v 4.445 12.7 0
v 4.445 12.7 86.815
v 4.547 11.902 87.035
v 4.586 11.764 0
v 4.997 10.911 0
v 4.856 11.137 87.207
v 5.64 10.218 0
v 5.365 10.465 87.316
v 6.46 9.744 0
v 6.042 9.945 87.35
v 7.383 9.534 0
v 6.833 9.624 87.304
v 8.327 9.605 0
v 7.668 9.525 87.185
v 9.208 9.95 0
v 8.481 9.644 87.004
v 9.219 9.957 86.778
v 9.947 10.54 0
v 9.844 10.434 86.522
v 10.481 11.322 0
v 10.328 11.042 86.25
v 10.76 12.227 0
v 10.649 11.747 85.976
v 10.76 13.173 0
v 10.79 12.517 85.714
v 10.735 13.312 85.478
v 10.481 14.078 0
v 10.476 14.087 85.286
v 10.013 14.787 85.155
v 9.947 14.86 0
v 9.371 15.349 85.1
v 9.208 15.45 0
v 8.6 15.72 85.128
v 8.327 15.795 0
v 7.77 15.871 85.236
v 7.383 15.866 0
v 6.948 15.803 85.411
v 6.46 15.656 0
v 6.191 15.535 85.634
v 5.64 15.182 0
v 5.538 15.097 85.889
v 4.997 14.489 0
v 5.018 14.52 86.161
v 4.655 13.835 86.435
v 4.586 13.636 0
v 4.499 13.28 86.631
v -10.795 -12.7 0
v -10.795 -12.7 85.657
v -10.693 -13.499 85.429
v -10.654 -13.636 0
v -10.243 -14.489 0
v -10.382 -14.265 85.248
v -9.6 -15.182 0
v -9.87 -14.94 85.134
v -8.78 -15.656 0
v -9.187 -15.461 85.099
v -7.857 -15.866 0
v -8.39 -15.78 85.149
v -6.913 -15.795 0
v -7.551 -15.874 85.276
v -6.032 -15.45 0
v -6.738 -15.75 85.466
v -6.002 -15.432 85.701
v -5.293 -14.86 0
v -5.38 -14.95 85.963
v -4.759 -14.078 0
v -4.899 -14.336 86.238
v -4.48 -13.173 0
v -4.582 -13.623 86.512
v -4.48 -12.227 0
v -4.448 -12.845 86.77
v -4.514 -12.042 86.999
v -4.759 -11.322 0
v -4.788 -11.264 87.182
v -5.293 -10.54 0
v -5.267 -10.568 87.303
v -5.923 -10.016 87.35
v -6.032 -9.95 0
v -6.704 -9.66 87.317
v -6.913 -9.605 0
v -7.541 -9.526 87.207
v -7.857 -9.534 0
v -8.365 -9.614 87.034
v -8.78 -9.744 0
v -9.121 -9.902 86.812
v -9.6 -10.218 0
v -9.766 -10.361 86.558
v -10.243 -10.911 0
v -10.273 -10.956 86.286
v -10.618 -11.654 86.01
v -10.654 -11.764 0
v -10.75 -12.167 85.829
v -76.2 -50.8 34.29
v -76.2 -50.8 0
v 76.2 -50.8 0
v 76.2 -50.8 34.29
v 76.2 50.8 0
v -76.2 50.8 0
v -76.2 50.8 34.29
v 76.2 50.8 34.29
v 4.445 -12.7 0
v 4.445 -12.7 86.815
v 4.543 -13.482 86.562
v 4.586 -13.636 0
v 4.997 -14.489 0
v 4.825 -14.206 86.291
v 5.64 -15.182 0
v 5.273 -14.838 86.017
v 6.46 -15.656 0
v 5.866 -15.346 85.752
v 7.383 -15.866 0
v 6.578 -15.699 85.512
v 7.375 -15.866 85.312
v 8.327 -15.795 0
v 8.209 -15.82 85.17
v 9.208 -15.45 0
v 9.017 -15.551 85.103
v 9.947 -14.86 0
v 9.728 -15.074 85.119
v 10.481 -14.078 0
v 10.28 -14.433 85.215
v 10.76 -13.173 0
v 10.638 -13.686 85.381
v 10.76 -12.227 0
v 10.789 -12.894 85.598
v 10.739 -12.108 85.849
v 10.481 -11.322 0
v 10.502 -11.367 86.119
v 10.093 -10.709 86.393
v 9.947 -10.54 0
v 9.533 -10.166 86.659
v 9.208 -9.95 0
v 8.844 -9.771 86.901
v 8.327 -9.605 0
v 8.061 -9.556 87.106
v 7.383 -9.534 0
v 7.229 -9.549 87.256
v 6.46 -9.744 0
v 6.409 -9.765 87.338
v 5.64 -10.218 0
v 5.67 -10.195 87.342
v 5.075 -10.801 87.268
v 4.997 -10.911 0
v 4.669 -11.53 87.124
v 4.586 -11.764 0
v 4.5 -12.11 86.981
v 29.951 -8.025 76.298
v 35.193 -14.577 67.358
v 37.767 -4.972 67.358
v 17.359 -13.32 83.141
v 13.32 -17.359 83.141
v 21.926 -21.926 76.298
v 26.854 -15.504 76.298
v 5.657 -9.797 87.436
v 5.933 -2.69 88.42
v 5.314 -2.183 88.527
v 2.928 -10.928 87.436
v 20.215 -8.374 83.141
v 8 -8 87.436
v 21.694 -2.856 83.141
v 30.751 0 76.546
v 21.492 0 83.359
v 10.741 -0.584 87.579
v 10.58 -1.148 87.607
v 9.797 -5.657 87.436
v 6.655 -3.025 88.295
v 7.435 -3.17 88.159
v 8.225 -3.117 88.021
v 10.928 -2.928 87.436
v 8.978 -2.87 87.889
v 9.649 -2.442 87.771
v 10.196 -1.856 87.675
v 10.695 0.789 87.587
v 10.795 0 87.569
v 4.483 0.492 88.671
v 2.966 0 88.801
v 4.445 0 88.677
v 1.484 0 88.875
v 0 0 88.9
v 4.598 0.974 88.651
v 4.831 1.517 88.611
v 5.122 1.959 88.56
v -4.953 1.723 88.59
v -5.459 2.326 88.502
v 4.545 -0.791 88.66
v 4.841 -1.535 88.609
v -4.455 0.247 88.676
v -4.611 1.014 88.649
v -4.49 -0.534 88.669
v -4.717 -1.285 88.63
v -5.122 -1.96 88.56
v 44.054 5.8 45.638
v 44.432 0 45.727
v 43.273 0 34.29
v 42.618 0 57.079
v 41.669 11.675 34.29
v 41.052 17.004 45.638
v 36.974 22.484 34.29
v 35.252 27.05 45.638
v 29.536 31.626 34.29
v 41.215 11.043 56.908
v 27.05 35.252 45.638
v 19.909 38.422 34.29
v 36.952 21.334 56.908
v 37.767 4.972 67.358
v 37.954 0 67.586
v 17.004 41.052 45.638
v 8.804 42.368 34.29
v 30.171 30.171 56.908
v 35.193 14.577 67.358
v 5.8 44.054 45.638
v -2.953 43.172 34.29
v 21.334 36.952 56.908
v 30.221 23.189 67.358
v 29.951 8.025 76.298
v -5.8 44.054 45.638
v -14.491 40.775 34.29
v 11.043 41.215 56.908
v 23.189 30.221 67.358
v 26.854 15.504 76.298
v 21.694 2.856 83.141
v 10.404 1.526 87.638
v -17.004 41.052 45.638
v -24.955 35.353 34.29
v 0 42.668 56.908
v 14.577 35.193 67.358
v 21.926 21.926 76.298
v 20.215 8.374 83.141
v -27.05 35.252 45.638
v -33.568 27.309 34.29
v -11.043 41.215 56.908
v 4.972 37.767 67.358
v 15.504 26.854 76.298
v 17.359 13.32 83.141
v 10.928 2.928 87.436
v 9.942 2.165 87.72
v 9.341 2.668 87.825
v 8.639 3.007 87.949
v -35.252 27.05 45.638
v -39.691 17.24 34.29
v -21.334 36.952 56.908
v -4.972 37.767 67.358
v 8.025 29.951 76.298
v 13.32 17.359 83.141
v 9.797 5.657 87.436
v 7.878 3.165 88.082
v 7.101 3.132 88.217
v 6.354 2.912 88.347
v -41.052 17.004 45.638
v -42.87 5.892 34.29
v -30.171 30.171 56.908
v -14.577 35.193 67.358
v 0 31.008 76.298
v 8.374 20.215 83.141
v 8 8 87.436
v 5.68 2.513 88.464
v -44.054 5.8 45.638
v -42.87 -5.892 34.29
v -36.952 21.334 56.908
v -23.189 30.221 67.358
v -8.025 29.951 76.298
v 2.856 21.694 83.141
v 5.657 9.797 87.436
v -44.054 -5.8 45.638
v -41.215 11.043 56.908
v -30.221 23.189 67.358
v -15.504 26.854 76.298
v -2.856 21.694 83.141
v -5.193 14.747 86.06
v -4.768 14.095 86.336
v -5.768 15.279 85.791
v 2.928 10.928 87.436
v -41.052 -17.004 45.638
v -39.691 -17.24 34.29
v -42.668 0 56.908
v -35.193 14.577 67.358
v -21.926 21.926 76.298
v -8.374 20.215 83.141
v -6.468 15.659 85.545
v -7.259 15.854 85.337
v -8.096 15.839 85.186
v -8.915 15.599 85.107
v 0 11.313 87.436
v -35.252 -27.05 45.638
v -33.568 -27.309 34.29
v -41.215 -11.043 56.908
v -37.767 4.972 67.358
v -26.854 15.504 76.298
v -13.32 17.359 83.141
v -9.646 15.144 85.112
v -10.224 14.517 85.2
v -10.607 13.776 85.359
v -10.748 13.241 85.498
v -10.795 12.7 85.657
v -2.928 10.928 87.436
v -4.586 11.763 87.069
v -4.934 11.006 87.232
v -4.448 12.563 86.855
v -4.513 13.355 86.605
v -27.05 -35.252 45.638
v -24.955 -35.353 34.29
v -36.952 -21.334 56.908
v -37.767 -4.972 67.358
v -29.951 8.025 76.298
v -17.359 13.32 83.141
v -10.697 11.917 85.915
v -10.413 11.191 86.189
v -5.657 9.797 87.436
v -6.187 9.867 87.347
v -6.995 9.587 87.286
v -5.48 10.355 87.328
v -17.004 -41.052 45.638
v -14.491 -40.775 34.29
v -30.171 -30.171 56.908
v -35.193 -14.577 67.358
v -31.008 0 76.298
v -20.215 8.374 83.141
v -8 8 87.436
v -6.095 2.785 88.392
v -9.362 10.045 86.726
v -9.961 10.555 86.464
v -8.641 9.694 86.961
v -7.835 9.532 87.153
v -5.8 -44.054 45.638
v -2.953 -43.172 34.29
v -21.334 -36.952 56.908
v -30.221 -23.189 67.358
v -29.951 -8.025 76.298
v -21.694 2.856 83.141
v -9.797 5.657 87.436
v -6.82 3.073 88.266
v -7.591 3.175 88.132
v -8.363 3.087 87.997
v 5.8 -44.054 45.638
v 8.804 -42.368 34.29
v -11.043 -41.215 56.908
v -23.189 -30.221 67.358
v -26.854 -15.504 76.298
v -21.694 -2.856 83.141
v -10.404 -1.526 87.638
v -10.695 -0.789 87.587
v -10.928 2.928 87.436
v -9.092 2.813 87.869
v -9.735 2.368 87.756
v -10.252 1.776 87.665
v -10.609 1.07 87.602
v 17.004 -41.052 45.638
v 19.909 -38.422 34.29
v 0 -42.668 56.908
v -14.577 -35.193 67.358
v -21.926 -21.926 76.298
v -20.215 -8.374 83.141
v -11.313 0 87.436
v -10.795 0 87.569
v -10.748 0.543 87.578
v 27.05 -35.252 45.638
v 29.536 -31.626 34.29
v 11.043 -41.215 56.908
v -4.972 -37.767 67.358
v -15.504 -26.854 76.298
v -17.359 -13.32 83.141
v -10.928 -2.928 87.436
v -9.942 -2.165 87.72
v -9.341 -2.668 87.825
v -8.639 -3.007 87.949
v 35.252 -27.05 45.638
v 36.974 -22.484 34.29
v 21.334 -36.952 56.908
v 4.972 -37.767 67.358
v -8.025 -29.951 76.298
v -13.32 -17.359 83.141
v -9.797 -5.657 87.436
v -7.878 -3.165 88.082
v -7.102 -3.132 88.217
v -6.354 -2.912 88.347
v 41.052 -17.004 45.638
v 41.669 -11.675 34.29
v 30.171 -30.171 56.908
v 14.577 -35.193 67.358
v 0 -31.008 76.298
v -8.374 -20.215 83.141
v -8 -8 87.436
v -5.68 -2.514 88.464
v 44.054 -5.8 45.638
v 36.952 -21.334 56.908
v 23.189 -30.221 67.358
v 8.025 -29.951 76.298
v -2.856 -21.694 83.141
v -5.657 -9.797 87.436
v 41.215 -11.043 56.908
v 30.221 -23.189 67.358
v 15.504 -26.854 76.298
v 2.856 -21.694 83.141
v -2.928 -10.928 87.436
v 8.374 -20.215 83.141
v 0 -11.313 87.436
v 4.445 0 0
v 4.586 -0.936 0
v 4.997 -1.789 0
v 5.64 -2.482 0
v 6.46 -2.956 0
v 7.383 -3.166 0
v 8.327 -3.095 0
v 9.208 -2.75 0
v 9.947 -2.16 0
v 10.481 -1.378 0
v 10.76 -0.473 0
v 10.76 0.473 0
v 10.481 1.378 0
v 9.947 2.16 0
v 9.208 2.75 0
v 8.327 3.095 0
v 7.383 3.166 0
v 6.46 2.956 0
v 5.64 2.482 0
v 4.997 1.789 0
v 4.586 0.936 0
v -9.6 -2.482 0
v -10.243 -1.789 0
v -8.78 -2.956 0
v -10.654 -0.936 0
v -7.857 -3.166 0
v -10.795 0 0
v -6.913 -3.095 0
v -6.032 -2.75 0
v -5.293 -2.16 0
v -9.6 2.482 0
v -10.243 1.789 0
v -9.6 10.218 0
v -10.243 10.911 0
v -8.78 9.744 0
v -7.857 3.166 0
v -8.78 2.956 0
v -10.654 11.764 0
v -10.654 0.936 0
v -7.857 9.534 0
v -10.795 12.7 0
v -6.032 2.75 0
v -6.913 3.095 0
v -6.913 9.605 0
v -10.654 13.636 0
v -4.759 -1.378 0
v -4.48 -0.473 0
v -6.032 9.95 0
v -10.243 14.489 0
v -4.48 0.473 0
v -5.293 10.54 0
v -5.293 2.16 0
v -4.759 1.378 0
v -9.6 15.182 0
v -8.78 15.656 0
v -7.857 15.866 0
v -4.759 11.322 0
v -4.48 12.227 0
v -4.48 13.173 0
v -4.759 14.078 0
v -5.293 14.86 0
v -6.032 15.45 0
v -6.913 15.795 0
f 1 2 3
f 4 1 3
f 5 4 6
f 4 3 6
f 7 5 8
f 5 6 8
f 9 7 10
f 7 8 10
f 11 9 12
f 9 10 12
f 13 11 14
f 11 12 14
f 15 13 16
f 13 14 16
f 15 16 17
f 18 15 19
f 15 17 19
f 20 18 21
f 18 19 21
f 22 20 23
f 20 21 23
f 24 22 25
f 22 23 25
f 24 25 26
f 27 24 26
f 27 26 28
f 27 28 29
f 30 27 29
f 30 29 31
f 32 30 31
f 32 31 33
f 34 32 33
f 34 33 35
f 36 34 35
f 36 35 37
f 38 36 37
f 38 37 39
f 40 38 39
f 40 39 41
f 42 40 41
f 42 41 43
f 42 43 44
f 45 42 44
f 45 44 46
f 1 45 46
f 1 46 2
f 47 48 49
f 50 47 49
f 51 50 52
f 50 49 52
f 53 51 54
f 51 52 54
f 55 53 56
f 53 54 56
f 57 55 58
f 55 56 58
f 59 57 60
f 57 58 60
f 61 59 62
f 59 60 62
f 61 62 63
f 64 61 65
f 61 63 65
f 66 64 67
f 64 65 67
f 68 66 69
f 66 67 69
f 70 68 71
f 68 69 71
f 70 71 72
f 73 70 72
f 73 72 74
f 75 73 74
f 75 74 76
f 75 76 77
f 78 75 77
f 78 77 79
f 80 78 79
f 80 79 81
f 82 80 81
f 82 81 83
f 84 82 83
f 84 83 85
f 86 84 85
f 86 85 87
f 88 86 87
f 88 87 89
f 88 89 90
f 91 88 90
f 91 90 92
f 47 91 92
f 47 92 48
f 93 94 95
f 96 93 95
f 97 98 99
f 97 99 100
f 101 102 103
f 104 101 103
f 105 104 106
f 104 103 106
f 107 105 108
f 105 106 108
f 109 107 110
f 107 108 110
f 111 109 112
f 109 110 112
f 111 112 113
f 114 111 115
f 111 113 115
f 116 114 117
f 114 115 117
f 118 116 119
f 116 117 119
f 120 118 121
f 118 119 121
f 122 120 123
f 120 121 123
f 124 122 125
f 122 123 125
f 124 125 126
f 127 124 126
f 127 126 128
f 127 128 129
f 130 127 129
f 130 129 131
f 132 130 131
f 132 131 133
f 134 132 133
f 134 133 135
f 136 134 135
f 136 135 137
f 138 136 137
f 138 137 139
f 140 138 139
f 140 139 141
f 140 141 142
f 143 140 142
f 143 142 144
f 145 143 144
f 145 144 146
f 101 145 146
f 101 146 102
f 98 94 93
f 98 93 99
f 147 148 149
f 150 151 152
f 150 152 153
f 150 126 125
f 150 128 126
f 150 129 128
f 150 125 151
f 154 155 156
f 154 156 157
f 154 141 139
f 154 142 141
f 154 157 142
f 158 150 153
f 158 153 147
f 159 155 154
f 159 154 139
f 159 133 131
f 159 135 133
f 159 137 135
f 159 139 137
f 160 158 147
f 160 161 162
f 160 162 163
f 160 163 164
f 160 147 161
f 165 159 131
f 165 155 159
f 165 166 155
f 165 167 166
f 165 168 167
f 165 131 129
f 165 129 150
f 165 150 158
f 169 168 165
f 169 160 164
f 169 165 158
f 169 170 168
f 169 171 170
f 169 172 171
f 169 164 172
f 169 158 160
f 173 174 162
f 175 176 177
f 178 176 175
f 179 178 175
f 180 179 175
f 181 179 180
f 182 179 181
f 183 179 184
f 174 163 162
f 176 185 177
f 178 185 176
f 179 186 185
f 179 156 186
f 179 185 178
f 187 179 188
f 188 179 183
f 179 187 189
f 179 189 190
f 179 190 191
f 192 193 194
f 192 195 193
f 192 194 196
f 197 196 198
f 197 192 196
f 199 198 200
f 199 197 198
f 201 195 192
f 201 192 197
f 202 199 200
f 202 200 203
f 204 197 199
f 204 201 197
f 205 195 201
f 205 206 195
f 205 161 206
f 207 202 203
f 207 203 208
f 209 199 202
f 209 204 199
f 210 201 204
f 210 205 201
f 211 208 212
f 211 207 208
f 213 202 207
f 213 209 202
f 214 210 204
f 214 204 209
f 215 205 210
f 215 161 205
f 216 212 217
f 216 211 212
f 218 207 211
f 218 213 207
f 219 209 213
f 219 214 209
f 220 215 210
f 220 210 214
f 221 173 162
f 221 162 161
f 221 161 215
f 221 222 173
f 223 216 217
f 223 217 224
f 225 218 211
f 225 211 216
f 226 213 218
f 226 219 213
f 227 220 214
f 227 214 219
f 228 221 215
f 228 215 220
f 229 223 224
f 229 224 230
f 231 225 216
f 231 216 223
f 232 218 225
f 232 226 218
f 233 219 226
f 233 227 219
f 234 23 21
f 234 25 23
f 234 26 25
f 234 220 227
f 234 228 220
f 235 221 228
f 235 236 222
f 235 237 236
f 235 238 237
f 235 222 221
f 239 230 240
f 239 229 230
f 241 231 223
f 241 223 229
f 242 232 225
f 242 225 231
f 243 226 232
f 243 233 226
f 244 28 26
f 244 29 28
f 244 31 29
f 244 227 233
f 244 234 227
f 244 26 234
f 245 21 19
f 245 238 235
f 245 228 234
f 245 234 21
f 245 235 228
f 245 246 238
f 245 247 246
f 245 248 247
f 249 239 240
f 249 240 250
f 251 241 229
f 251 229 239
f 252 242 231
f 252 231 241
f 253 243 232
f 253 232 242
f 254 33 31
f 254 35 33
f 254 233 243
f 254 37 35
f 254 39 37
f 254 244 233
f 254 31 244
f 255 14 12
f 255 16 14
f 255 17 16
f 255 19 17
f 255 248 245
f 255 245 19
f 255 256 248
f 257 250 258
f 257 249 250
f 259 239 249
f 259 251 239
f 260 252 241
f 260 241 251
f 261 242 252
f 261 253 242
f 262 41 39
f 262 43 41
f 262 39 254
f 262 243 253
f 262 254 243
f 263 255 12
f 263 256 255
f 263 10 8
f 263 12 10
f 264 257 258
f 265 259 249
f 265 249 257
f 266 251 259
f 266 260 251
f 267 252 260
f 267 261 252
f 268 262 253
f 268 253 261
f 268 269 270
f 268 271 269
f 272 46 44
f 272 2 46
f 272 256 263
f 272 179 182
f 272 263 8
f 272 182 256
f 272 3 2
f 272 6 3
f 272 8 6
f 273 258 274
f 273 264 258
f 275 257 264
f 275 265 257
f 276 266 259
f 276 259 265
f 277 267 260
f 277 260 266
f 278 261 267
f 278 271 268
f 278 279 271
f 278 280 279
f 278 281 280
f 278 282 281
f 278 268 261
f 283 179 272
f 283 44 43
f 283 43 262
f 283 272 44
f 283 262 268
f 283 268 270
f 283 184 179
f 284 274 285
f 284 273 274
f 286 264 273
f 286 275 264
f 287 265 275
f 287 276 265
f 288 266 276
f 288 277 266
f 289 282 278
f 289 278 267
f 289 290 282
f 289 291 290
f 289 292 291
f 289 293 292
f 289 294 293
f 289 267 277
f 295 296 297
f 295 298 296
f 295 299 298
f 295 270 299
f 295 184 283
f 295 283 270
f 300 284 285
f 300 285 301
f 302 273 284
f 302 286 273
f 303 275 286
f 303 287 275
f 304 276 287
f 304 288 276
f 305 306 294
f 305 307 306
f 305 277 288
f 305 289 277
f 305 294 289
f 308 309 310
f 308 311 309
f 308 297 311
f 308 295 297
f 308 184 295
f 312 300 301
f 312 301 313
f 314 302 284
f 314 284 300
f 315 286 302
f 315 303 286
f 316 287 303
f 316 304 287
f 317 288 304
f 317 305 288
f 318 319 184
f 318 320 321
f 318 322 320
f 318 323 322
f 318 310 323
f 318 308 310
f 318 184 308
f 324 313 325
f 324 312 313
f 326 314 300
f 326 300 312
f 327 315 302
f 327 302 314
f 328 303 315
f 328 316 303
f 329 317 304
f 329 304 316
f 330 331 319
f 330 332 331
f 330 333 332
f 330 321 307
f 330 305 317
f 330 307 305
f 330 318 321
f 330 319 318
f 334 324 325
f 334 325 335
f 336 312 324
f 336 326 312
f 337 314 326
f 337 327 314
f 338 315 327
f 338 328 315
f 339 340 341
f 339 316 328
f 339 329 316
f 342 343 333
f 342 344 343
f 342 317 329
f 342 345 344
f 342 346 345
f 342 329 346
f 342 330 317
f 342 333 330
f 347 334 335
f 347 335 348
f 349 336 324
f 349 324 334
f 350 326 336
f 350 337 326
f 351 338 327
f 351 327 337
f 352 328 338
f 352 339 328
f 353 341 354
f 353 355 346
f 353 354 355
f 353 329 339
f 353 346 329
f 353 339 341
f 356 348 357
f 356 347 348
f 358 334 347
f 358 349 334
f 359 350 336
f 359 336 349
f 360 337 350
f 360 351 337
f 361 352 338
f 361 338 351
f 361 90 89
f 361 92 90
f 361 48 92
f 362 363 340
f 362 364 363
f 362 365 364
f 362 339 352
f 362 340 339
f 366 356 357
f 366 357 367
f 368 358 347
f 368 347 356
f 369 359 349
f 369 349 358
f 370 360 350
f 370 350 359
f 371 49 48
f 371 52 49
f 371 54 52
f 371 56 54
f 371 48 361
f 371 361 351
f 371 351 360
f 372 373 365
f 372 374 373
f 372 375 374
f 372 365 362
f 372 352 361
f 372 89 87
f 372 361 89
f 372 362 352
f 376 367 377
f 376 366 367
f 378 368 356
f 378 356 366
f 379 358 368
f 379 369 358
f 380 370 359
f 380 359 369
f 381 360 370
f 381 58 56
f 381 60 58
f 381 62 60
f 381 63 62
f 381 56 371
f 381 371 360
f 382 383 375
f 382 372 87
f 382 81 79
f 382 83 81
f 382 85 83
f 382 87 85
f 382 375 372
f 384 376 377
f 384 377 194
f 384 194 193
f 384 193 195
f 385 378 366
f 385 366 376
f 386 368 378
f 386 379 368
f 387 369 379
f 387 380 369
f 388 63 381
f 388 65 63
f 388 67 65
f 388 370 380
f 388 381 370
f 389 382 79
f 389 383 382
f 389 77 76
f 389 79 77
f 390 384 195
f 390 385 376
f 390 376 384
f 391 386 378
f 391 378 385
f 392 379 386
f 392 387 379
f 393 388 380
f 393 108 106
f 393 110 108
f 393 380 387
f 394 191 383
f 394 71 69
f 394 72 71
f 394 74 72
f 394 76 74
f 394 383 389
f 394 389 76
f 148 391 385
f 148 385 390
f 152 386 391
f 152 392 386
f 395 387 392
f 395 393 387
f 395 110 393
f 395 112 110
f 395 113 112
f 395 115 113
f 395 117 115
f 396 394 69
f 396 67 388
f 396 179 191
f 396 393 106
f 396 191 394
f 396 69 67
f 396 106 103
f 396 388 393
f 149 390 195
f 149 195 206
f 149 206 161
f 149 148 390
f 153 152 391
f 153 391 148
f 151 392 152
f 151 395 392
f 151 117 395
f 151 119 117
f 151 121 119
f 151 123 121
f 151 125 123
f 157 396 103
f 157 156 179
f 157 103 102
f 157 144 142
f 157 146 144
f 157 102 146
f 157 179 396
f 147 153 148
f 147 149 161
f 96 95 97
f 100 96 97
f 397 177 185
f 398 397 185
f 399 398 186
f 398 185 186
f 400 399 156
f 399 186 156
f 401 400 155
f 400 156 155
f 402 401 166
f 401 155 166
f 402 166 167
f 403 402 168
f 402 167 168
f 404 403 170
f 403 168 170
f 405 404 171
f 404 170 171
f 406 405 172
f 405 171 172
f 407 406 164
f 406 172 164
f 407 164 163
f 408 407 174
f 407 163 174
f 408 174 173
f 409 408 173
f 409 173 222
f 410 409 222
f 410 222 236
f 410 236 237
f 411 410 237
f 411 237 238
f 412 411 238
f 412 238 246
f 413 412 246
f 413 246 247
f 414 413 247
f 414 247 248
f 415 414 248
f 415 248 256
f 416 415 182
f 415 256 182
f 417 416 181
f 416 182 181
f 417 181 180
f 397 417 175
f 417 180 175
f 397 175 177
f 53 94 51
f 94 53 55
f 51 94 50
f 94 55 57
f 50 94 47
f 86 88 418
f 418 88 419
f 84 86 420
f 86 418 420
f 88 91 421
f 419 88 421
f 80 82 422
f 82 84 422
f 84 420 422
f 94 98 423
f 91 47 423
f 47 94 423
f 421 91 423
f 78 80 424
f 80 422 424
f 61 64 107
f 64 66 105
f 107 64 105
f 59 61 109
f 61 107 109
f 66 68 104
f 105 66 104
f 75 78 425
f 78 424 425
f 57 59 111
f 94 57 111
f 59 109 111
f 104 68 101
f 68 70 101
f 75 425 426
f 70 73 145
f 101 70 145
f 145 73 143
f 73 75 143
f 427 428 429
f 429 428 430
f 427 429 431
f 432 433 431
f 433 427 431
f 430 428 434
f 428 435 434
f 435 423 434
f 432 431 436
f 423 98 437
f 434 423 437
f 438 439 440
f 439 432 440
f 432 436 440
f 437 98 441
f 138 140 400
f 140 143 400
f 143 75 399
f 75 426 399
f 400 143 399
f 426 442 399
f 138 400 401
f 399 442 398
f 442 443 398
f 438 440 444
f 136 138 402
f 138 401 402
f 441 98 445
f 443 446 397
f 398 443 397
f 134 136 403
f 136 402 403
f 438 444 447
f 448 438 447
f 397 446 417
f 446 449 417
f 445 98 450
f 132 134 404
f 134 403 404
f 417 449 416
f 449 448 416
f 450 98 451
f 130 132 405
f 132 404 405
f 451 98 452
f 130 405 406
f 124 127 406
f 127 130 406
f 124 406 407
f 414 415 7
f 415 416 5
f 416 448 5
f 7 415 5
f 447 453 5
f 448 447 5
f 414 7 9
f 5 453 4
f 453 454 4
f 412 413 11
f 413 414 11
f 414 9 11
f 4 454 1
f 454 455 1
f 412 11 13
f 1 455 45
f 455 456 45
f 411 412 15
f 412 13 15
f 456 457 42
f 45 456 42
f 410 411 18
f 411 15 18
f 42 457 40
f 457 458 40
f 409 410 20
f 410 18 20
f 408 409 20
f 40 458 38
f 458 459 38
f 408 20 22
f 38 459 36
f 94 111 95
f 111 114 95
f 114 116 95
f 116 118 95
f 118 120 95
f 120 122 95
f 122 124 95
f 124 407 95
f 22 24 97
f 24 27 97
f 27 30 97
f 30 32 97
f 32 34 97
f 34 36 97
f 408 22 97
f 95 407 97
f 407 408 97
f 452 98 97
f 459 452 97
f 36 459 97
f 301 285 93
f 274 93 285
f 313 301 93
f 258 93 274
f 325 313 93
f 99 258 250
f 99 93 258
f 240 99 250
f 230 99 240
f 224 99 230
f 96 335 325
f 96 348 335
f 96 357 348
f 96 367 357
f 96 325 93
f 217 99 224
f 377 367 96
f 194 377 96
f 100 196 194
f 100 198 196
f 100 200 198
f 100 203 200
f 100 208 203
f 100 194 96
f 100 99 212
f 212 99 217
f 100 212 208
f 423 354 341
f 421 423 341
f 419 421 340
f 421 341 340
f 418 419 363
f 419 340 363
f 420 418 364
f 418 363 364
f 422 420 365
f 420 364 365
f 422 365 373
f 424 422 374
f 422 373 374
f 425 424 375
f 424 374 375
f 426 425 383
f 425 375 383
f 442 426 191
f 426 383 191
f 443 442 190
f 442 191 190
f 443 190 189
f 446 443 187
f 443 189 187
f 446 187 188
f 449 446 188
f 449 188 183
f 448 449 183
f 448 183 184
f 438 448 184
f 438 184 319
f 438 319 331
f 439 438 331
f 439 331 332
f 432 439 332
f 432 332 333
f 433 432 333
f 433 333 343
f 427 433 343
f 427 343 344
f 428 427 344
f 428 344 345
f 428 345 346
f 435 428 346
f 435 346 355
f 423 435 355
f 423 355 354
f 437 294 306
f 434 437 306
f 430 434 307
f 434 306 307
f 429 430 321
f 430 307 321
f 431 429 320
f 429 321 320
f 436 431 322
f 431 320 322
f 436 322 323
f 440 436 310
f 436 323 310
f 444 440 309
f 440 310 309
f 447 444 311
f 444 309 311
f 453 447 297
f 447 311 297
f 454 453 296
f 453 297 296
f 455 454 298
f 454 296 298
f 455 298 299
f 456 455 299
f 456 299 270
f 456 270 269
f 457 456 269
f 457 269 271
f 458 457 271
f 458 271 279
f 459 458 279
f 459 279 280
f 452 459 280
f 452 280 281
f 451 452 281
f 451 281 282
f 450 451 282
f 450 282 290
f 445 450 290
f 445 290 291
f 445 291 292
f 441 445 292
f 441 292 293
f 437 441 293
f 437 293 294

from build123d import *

# Parameters (mm, degrees)
F0_W     = 152.4
F0_H     = 101.6
F1_DEPTH = 34.29
F5_D     = 6.35


with BuildPart() as f1:
    # F0 (on Top) → F1 (new body)
    with BuildSketch(Plane.XY):
        Rectangle(F0_W, F0_H)
    extrude(amount=F1_DEPTH)

    # F2 (on Front) → F3 (revolve)
    with BuildSketch(Plane.XZ):
        with BuildLine():
            Line((0, 88.9), (0, 0))
            ThreePointArc((0, 0), (44.45, 44.45), (0, 88.9))
        make_face()
    revolve(axis=Axis((0, 0, 44.45), (0, 0, 1)))

    # F5 (through all)
    with Locations(Plane(origin=(0, 0, 0), x_dir=(1, 0, 0), z_dir=(0, 0, -1))):
        with Locations((-7.62, 12.7), (7.62, 12.7), (-7.62, 0), (7.62, -12.7), (-7.62, -12.7), (7.62, 0)):
            Hole(F5_D / 2)


solid = f1.part
